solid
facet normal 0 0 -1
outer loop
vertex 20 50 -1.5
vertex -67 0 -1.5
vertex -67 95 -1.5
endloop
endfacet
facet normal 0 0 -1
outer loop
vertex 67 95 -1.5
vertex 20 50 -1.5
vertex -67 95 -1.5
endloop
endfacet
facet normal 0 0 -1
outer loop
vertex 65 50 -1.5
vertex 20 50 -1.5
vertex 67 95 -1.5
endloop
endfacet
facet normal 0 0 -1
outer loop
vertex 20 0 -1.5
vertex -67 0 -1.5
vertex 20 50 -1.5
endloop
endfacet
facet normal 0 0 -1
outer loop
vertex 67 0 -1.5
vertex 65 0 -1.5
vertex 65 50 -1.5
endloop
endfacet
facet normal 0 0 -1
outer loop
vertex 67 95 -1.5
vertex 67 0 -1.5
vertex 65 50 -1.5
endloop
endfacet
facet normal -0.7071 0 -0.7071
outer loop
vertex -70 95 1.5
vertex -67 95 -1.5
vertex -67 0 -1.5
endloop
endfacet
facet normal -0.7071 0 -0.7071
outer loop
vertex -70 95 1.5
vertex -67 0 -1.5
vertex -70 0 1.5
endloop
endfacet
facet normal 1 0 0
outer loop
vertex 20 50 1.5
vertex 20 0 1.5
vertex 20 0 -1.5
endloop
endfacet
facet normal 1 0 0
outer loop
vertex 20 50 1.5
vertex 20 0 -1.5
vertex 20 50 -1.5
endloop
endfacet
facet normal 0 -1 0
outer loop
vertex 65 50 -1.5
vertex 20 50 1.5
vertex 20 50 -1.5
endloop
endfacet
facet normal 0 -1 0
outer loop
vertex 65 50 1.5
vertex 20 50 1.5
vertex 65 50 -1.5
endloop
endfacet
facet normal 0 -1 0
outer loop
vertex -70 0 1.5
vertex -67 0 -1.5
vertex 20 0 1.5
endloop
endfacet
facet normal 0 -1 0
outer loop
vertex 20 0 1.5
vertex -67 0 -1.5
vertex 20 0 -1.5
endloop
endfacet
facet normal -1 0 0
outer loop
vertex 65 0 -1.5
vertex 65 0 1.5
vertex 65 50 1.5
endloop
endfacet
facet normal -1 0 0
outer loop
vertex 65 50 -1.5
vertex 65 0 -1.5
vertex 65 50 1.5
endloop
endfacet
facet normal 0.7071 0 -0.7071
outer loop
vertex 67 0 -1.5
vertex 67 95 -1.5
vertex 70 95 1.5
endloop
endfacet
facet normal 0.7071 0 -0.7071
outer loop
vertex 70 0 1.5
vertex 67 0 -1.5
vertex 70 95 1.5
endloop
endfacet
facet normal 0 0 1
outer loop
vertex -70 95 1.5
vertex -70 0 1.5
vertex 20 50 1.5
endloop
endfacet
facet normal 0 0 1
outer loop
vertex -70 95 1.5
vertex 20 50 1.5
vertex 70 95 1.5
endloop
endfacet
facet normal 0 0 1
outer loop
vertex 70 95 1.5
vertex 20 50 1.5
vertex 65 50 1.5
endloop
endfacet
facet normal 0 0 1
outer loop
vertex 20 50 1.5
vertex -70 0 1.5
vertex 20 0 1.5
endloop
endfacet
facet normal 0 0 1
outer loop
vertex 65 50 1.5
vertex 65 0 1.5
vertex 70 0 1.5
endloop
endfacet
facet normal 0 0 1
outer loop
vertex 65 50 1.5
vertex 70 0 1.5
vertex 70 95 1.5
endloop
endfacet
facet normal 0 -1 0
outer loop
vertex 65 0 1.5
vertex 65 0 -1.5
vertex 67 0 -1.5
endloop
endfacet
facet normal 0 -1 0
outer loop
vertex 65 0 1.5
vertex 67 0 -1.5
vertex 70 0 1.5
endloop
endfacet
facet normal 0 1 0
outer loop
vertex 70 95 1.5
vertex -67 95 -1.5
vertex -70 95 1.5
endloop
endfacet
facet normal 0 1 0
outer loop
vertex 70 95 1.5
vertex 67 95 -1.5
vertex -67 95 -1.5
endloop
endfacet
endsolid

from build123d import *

# Parameters (mm, degrees)
SKETCH1_W           = 140
SKETCH1_H           = 3
BOSS_EXTRUDE1_DEPTH = 95
CUT_EXTRUDE1_DEPTH  = 95
SKETCH4_W           = 45
SKETCH4_H           = 50
CUT_EXTRUDE3_DEPTH  = 10


with BuildPart() as part:
    # Sketch1 → Boss-Extrude1 (new body)
    with BuildSketch(Plane(origin=(0, 0, 0), x_dir=(1, 0, 0), z_dir=(0, 1, 0))):
        Rectangle(SKETCH1_W, SKETCH1_H)
    extrude(amount=BOSS_EXTRUDE1_DEPTH)

    # Sketch 377 → Cut-Extrude1 (cut)
    with BuildSketch(Plane(origin=(0, 95, 0), x_dir=(1, 0, 0), z_dir=(0, 1, 0))):
        Polygon((70, -1.5), (70, 1.5), (67, 1.5), align=None)
        Polygon((-70, -1.5), (-70, 1.5), (-67, 1.5), align=None)
    extrude(amount=-CUT_EXTRUDE1_DEPTH, mode=Mode.SUBTRACT)

    # Sketch4 → Cut-Extrude3 (cut)
    with BuildSketch(Plane.XY.offset(1.5)):
        with Locations((42.5, 25)):
            Rectangle(SKETCH4_W, SKETCH4_H)
    extrude(amount=-CUT_EXTRUDE3_DEPTH, mode=Mode.SUBTRACT)


solid = part.part
